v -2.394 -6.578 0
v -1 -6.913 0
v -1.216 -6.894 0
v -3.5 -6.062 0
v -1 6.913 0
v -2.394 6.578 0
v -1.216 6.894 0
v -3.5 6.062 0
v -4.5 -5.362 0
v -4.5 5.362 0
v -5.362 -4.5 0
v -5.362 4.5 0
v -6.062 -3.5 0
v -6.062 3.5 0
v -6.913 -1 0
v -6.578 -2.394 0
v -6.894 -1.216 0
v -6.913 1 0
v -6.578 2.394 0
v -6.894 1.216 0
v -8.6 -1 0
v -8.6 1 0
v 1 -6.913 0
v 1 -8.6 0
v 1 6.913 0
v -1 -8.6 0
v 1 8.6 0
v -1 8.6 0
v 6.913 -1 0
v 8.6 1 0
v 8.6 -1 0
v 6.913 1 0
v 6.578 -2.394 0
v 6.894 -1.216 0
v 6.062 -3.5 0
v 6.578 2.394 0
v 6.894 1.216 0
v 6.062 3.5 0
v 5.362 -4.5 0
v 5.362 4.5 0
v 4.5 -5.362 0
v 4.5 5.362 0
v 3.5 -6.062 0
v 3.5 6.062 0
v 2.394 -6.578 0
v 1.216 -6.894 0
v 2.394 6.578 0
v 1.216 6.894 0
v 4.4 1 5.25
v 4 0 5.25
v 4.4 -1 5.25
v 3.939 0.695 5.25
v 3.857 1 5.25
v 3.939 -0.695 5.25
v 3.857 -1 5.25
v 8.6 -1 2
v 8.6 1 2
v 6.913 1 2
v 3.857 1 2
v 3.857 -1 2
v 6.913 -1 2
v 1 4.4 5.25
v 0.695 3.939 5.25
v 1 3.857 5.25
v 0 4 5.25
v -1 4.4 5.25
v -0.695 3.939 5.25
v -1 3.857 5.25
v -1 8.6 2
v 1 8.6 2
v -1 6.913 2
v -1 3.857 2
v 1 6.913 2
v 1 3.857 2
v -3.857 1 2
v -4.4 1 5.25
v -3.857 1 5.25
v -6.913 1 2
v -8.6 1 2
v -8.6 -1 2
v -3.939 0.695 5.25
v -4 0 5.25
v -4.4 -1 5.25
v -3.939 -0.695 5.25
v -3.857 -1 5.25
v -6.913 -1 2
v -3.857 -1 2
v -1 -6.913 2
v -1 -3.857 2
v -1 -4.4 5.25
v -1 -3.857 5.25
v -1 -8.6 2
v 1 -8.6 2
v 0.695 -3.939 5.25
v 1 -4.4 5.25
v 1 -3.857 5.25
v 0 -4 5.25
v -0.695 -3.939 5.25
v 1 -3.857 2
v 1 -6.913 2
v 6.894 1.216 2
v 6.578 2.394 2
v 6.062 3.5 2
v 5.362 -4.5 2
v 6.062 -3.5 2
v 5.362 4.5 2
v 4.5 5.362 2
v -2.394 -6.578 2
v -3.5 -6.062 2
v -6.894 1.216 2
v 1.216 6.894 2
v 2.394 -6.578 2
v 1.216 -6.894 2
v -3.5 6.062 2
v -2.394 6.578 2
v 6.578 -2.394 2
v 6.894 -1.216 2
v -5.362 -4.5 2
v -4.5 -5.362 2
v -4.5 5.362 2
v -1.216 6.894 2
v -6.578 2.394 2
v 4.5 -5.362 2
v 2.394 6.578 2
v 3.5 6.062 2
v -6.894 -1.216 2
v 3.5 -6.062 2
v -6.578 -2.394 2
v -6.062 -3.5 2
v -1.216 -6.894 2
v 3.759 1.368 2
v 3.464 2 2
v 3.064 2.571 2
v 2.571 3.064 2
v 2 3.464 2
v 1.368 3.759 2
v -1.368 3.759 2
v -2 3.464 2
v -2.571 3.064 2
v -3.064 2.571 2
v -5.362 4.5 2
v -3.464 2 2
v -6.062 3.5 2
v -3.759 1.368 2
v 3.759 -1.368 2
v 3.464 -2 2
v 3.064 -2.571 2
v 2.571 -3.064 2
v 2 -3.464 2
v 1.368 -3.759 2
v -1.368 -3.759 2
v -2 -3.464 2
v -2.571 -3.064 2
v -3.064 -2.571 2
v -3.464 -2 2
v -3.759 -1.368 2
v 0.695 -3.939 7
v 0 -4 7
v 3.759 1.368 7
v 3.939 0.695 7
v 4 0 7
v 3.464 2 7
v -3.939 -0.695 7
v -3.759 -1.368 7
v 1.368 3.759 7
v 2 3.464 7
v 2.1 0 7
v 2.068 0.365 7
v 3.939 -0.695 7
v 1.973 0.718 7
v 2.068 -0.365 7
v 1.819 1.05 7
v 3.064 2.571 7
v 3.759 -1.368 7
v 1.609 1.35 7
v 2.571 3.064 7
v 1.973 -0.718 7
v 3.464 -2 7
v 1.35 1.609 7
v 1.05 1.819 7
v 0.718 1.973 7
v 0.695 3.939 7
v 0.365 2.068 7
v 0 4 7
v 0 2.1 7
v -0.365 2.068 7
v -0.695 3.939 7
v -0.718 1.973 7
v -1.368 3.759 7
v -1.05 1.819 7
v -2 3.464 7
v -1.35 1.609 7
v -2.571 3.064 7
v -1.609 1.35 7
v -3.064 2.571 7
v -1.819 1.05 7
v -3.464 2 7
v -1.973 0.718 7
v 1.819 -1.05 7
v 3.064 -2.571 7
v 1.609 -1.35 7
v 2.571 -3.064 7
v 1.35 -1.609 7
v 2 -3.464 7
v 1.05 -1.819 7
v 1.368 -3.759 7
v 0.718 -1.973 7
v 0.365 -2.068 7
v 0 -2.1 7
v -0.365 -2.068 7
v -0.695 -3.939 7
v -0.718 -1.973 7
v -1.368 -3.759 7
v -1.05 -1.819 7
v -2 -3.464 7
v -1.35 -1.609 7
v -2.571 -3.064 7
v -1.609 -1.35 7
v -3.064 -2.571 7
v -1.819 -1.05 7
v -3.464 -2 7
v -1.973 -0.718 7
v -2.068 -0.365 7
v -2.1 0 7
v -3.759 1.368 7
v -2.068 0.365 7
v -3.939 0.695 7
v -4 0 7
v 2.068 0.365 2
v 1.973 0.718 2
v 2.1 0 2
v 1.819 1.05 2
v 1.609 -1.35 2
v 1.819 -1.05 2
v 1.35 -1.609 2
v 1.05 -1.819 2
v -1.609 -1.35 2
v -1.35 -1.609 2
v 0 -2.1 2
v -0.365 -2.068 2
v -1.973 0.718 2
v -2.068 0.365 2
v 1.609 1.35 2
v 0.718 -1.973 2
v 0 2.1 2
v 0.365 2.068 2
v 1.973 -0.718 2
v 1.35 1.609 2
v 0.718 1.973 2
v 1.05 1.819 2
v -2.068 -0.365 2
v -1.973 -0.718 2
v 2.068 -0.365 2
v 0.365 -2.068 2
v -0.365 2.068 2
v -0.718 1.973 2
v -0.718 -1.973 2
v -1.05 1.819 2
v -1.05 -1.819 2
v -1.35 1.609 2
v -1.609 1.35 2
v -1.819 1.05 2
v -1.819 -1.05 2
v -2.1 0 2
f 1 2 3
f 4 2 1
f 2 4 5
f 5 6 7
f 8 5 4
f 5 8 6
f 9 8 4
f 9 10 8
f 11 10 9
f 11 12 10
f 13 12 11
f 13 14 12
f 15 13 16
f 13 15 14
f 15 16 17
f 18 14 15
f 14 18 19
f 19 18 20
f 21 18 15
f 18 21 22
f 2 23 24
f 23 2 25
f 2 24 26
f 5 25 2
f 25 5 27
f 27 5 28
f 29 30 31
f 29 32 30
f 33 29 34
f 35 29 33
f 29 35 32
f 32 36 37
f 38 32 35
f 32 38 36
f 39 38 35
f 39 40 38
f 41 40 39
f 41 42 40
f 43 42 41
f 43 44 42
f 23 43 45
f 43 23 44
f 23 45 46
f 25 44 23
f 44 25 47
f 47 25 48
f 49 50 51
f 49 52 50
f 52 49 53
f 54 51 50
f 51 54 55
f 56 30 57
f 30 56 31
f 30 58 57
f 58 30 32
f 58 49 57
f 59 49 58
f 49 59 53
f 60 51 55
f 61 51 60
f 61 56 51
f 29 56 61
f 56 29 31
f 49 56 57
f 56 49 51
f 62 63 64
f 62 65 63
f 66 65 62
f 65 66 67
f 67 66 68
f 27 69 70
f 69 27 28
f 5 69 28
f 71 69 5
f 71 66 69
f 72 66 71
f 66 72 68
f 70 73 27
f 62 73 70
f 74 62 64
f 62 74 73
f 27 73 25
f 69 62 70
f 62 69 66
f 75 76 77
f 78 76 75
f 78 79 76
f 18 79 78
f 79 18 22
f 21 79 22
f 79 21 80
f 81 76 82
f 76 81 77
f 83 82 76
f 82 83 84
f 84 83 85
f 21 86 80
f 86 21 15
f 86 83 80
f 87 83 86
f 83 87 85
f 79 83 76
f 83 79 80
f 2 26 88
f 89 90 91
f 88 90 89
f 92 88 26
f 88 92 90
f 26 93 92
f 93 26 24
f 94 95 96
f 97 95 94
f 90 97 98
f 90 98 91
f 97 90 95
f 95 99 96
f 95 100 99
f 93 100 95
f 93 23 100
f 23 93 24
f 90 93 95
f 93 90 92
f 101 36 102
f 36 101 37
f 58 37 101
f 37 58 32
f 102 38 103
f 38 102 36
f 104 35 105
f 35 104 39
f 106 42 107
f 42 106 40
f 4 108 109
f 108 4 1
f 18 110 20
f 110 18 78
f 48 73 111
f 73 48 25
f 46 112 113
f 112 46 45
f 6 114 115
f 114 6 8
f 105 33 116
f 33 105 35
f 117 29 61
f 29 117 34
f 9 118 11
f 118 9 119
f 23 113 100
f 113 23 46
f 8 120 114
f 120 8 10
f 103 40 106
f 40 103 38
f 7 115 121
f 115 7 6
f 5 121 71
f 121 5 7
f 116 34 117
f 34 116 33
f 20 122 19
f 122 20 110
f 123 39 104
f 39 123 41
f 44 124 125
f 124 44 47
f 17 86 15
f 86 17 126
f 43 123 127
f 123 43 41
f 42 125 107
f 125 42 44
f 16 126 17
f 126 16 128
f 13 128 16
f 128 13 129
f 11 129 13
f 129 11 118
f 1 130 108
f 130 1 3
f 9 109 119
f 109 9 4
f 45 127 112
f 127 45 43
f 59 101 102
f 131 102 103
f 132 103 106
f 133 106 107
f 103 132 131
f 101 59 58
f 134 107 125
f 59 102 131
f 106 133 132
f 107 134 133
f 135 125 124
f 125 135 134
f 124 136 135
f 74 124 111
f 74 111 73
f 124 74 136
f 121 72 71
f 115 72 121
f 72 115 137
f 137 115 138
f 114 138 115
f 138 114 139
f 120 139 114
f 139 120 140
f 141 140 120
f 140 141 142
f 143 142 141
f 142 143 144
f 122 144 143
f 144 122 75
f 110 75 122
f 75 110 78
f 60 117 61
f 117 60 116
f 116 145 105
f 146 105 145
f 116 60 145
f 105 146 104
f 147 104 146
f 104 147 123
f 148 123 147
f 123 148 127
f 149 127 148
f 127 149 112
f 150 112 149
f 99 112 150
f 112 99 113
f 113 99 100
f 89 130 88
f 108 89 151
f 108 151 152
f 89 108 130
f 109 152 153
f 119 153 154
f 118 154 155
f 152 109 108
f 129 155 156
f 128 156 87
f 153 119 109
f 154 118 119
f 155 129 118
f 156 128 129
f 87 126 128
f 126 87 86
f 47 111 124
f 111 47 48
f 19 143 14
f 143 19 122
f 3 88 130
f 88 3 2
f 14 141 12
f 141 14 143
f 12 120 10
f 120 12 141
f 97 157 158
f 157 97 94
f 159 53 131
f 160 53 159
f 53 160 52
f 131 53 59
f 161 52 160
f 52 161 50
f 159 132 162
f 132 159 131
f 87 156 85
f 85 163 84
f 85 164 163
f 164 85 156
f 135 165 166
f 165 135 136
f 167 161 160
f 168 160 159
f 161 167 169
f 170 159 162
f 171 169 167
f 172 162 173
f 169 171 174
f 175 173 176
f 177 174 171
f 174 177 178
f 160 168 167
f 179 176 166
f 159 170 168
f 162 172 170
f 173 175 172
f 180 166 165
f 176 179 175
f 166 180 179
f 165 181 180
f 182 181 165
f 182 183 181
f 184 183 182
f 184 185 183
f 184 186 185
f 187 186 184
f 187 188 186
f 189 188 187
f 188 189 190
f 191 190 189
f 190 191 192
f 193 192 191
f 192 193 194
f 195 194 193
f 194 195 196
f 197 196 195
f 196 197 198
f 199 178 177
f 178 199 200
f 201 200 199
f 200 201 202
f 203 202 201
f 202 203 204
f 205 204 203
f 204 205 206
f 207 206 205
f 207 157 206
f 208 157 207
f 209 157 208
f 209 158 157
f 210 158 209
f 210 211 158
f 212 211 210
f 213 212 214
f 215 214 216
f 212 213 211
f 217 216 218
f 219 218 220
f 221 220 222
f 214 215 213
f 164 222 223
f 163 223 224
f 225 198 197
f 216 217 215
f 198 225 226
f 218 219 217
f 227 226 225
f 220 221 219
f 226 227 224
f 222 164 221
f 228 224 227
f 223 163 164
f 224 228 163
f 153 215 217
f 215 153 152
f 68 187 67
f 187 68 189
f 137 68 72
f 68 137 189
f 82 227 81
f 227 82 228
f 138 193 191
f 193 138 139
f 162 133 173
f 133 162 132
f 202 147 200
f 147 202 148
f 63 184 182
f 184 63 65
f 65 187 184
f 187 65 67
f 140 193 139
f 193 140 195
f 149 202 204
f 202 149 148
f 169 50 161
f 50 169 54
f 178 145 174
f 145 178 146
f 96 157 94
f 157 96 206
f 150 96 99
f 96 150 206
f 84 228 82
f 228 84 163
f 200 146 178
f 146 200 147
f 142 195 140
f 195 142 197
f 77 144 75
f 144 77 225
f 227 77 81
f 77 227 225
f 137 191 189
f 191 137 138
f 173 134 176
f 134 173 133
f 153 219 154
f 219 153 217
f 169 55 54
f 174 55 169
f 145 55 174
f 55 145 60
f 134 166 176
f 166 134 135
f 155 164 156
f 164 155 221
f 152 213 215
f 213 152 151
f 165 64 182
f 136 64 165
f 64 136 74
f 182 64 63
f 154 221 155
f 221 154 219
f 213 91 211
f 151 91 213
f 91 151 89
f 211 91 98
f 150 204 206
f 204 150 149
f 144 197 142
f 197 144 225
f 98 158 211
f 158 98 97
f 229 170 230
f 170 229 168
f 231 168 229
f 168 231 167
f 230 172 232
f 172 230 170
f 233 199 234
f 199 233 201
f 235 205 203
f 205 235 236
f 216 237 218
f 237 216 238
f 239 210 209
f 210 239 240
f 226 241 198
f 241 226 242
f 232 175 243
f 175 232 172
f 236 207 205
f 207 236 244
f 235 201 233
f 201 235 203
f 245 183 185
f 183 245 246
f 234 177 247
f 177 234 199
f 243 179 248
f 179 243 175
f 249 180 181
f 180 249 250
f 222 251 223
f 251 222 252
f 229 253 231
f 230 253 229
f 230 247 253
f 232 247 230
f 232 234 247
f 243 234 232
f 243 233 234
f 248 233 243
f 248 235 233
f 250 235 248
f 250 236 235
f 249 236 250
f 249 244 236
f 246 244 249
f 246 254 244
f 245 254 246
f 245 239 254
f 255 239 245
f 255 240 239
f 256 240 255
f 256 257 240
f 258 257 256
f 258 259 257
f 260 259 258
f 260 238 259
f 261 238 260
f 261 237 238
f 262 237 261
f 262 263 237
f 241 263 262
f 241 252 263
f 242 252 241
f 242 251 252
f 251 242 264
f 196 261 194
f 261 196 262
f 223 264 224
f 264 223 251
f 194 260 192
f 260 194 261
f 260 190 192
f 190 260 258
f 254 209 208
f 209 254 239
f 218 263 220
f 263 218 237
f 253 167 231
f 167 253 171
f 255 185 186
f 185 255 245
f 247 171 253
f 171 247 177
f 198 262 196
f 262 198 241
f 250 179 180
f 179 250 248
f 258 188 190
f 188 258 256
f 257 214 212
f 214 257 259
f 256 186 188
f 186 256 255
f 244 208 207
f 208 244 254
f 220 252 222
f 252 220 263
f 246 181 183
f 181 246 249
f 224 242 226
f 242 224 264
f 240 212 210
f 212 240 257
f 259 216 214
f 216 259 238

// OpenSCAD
// Reusable heat-set insert boss with base pad and optional gussets.

$fn = 36;

insert_hole_diameter = 4.2;
insert_depth = 5.0;
boss_outer_diameter = 8.0;
boss_height = 7.0;
base_diameter = 14.0;
base_height = 2.0;
gusset_enabled = true;
gusset_length = 8.0;
gusset_thickness = 2.0;
show_example = true;

module heat_set_insert_boss() {
    difference() {
        union() {
            cylinder(h = base_height, d = base_diameter);
            cylinder(h = boss_height, d = boss_outer_diameter);

            if (gusset_enabled) {
                for (a = [0, 90, 180, 270]) {
                    rotate([0, 0, a])
                        hull() {
                            translate([boss_outer_diameter / 2 - 0.2, -gusset_thickness / 2, 0])
                                cube([0.6, gusset_thickness, boss_height * 0.75]);
                            translate([gusset_length, -gusset_thickness / 2, 0])
                                cube([0.6, gusset_thickness, base_height]);
                        }
                }
            }
        }

        translate([0, 0, boss_height - insert_depth])
            cylinder(h = insert_depth + 0.1, d = insert_hole_diameter);
    }
}

if (show_example)
    heat_set_insert_boss();
